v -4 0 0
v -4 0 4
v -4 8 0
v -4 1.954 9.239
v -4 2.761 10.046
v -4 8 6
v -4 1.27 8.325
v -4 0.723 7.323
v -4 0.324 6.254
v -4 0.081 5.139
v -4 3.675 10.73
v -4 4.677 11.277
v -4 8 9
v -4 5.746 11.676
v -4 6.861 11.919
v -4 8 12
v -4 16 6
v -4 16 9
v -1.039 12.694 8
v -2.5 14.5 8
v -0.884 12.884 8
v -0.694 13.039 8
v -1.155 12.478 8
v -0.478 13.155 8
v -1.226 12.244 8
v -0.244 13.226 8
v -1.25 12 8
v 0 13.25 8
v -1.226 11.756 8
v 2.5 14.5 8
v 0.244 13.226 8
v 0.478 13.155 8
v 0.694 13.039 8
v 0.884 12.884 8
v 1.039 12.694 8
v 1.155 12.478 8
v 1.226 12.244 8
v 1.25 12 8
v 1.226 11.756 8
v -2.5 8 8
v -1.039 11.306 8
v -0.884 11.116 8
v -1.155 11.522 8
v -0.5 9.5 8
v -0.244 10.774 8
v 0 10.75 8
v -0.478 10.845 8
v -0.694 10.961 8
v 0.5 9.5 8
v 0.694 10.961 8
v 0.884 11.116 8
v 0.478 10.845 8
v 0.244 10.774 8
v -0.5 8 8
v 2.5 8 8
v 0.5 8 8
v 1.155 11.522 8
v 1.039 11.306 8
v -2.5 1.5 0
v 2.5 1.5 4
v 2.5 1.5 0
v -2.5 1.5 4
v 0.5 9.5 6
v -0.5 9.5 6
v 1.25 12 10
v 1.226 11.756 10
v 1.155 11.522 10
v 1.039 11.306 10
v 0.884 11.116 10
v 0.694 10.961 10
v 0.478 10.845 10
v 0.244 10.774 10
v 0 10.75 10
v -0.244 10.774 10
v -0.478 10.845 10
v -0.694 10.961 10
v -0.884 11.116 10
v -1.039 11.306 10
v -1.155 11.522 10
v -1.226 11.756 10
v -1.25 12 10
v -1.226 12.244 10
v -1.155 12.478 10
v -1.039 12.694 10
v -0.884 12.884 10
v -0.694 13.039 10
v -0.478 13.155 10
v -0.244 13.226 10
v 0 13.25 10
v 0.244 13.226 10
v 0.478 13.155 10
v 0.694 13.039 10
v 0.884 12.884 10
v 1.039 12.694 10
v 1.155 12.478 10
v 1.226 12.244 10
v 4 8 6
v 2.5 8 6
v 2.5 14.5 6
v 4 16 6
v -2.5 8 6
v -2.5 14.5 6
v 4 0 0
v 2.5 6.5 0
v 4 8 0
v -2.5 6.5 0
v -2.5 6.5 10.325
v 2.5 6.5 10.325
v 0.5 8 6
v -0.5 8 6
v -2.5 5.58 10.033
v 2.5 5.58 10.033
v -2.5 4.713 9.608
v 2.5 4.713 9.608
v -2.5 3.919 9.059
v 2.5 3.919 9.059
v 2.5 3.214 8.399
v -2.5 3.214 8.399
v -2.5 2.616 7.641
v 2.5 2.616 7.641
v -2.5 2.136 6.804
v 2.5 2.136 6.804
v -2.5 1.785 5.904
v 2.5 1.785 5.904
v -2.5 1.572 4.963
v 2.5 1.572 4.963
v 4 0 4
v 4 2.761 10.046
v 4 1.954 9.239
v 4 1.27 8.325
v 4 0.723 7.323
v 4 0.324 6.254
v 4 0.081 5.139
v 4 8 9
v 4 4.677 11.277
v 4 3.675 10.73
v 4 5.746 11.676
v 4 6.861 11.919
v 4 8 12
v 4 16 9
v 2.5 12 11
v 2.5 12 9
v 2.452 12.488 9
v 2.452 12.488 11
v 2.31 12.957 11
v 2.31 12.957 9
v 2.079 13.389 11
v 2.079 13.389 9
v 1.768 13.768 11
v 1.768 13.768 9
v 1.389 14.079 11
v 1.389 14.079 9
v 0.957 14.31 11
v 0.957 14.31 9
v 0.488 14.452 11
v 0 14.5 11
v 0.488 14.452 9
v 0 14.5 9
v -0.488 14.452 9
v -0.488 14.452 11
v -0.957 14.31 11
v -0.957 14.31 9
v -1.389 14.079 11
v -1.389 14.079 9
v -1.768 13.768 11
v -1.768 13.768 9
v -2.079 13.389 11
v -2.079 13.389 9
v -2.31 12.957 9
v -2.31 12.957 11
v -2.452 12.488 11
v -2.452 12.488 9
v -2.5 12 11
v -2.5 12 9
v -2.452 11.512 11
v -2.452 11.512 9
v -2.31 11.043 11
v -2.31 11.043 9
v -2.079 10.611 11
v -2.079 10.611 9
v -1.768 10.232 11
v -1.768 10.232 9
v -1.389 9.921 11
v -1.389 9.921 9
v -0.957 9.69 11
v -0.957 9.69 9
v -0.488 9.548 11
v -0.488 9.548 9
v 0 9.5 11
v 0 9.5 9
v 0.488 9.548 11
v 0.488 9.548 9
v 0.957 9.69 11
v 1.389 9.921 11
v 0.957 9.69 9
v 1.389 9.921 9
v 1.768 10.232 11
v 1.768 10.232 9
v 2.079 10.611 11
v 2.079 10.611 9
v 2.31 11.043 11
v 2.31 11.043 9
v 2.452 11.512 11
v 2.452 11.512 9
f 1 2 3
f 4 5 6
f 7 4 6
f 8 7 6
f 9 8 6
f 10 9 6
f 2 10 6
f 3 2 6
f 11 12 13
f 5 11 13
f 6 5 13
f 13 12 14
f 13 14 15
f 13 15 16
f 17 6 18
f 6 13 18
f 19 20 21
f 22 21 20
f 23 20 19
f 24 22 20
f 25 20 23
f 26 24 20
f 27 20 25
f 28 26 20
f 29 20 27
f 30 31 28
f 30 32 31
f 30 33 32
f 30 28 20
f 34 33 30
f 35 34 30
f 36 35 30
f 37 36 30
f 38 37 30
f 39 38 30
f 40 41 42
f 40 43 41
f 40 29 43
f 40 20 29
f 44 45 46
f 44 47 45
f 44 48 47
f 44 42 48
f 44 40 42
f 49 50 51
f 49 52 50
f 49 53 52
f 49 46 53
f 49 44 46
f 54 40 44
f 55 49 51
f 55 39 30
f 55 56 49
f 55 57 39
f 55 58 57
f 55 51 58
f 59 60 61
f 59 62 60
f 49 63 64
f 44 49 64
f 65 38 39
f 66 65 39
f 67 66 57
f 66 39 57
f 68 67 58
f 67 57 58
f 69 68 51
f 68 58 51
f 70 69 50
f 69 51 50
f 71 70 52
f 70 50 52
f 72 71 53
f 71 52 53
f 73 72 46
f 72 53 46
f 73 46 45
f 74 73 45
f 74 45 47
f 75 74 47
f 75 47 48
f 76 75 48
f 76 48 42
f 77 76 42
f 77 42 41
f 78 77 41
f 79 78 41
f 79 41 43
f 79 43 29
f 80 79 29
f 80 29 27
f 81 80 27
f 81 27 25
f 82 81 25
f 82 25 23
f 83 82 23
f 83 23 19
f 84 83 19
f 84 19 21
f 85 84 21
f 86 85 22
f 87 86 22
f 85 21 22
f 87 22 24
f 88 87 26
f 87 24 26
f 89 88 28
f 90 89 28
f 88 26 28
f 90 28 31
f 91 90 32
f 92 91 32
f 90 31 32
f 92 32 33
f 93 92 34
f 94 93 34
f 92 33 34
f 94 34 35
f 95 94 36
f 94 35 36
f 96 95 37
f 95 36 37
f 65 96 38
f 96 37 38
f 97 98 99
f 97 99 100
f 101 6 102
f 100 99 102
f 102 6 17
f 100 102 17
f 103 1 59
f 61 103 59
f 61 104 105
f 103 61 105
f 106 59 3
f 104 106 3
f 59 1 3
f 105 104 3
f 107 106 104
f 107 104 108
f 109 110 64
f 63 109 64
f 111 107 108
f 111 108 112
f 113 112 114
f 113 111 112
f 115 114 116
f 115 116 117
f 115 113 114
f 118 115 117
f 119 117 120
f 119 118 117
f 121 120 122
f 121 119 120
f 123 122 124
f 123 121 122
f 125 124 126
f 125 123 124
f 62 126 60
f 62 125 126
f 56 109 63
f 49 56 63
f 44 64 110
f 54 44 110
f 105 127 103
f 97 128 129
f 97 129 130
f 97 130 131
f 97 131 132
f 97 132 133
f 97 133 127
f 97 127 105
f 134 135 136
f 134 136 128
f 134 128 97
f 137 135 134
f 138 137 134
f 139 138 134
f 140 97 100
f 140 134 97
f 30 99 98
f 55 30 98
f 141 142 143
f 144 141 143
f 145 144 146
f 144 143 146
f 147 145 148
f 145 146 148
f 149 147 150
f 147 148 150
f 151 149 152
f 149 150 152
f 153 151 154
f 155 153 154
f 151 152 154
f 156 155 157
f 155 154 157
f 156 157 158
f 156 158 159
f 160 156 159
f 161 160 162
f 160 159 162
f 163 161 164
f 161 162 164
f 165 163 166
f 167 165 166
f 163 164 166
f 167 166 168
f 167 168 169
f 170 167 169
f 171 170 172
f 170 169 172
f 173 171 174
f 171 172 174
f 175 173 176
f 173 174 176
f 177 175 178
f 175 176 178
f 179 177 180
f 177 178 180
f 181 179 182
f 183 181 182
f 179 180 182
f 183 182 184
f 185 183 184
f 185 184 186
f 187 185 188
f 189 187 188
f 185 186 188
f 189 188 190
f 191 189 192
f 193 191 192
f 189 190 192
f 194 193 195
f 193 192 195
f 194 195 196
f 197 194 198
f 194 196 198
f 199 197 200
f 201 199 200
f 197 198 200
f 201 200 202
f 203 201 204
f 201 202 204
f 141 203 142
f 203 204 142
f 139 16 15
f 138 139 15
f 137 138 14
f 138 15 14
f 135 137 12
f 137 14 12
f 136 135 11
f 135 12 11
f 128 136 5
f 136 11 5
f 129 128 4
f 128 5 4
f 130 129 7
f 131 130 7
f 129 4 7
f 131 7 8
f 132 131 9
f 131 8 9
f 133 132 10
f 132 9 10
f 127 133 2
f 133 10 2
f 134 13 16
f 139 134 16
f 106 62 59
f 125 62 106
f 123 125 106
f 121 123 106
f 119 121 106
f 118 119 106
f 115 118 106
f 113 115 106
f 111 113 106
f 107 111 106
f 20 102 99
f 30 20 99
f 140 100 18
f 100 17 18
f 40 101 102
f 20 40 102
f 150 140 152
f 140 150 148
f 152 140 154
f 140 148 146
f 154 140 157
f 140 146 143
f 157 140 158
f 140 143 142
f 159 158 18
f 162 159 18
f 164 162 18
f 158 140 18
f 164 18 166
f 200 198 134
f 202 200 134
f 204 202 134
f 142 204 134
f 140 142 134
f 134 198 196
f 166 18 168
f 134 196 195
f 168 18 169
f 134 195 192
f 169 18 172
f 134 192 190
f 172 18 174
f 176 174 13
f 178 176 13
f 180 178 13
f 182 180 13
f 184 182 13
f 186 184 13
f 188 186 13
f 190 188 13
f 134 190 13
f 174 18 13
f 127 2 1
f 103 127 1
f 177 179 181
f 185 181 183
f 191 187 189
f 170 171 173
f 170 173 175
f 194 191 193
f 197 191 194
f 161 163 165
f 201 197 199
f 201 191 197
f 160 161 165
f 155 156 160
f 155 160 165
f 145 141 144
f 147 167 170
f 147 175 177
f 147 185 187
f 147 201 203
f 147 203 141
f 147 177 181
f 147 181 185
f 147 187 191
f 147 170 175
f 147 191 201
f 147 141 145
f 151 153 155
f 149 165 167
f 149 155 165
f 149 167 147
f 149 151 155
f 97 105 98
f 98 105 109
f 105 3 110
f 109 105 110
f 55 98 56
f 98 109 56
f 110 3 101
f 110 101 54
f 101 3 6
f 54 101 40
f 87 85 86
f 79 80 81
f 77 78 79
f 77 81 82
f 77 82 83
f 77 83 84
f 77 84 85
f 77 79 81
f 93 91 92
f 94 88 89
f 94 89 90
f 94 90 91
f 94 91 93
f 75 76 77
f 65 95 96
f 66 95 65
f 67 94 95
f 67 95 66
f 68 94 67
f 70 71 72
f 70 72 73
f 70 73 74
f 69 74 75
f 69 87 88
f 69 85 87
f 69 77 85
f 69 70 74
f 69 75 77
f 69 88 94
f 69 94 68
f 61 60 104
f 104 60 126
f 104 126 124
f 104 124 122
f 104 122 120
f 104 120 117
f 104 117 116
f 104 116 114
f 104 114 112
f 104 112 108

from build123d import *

# Parameters (mm, degrees)
F1_DEPTH  = 4
F3_DEPTH  = 2.5
F5_R      = 2.5
F6_DEPTH  = 2
F7_R      = 1.25
F8_DEPTH  = 4
F10_DEPTH = 2


with BuildPart() as f1:
    # F0 (on Right) → F1 (new body)
    with BuildSketch(Plane.YZ):
        with BuildLine():
            Line((0, 4), (0, 0))
            Line((0, 0), (8, 0))
            Line((8, 0), (8, 6))
            Line((8, 6), (16, 6))
            Line((16, 6), (16, 9))
            Line((16, 9), (8, 9))
            Line((8, 9), (8, 12))
            ThreePointArc((8, 12), (2.343146, 9.656854), (0, 4))
        make_face()
    extrude(amount=-F1_DEPTH)

    # F2 (on face) → F3 (cut)
    with BuildSketch(Plane.YZ):
        with BuildLine():
            Line((6.5, 0), (6.5, 10.324555))
            ThreePointArc((6.5, 10.324555), (2.90098, 8.031129), (1.5, 4))
            Line((1.5, 4), (1.5, 0))
            Line((1.5, 0), (6.5, 0))
        make_face()
    extrude(amount=-F3_DEPTH, mode=Mode.SUBTRACT)

    # F4: F1 across face


with BuildPart() as f1_1:
    add(f1.part)
    add(f1.part.mirror(Plane(origin=(0, 7.388969, 6.713356), x_dir=(0, 1, 0), z_dir=(1, 0, 0))))

    # F5 (on face) → F6 (join)
    with BuildSketch(Plane.XY.offset(9)):
        with Locations((0, 12)):
            Circle(F5_R)
    extrude(amount=F6_DEPTH)

    # F7 (on face) → F8 (cut)
    with BuildSketch(Plane(origin=(0, 0, 6), x_dir=(1, 0, 0), z_dir=(0, 0, -1))):
        with Locations((0, -12)):
            Circle(F7_R)
    extrude(amount=-F8_DEPTH, mode=Mode.SUBTRACT)

    # F9 (on face) → F10 (cut)
    with BuildSketch(Plane(origin=(0, 0, 6), x_dir=(1, 0, 0), z_dir=(0, 0, -1))):
        Polygon((-2.5, -8), (-2.5, -14.5), (2.5, -14.5), (2.5, -8), (0.5, -8), (0.5, -9.5), (-0.5, -9.5), (-0.5, -8), align=None)
    extrude(amount=-F10_DEPTH, mode=Mode.SUBTRACT)


solid = f1_1.part
